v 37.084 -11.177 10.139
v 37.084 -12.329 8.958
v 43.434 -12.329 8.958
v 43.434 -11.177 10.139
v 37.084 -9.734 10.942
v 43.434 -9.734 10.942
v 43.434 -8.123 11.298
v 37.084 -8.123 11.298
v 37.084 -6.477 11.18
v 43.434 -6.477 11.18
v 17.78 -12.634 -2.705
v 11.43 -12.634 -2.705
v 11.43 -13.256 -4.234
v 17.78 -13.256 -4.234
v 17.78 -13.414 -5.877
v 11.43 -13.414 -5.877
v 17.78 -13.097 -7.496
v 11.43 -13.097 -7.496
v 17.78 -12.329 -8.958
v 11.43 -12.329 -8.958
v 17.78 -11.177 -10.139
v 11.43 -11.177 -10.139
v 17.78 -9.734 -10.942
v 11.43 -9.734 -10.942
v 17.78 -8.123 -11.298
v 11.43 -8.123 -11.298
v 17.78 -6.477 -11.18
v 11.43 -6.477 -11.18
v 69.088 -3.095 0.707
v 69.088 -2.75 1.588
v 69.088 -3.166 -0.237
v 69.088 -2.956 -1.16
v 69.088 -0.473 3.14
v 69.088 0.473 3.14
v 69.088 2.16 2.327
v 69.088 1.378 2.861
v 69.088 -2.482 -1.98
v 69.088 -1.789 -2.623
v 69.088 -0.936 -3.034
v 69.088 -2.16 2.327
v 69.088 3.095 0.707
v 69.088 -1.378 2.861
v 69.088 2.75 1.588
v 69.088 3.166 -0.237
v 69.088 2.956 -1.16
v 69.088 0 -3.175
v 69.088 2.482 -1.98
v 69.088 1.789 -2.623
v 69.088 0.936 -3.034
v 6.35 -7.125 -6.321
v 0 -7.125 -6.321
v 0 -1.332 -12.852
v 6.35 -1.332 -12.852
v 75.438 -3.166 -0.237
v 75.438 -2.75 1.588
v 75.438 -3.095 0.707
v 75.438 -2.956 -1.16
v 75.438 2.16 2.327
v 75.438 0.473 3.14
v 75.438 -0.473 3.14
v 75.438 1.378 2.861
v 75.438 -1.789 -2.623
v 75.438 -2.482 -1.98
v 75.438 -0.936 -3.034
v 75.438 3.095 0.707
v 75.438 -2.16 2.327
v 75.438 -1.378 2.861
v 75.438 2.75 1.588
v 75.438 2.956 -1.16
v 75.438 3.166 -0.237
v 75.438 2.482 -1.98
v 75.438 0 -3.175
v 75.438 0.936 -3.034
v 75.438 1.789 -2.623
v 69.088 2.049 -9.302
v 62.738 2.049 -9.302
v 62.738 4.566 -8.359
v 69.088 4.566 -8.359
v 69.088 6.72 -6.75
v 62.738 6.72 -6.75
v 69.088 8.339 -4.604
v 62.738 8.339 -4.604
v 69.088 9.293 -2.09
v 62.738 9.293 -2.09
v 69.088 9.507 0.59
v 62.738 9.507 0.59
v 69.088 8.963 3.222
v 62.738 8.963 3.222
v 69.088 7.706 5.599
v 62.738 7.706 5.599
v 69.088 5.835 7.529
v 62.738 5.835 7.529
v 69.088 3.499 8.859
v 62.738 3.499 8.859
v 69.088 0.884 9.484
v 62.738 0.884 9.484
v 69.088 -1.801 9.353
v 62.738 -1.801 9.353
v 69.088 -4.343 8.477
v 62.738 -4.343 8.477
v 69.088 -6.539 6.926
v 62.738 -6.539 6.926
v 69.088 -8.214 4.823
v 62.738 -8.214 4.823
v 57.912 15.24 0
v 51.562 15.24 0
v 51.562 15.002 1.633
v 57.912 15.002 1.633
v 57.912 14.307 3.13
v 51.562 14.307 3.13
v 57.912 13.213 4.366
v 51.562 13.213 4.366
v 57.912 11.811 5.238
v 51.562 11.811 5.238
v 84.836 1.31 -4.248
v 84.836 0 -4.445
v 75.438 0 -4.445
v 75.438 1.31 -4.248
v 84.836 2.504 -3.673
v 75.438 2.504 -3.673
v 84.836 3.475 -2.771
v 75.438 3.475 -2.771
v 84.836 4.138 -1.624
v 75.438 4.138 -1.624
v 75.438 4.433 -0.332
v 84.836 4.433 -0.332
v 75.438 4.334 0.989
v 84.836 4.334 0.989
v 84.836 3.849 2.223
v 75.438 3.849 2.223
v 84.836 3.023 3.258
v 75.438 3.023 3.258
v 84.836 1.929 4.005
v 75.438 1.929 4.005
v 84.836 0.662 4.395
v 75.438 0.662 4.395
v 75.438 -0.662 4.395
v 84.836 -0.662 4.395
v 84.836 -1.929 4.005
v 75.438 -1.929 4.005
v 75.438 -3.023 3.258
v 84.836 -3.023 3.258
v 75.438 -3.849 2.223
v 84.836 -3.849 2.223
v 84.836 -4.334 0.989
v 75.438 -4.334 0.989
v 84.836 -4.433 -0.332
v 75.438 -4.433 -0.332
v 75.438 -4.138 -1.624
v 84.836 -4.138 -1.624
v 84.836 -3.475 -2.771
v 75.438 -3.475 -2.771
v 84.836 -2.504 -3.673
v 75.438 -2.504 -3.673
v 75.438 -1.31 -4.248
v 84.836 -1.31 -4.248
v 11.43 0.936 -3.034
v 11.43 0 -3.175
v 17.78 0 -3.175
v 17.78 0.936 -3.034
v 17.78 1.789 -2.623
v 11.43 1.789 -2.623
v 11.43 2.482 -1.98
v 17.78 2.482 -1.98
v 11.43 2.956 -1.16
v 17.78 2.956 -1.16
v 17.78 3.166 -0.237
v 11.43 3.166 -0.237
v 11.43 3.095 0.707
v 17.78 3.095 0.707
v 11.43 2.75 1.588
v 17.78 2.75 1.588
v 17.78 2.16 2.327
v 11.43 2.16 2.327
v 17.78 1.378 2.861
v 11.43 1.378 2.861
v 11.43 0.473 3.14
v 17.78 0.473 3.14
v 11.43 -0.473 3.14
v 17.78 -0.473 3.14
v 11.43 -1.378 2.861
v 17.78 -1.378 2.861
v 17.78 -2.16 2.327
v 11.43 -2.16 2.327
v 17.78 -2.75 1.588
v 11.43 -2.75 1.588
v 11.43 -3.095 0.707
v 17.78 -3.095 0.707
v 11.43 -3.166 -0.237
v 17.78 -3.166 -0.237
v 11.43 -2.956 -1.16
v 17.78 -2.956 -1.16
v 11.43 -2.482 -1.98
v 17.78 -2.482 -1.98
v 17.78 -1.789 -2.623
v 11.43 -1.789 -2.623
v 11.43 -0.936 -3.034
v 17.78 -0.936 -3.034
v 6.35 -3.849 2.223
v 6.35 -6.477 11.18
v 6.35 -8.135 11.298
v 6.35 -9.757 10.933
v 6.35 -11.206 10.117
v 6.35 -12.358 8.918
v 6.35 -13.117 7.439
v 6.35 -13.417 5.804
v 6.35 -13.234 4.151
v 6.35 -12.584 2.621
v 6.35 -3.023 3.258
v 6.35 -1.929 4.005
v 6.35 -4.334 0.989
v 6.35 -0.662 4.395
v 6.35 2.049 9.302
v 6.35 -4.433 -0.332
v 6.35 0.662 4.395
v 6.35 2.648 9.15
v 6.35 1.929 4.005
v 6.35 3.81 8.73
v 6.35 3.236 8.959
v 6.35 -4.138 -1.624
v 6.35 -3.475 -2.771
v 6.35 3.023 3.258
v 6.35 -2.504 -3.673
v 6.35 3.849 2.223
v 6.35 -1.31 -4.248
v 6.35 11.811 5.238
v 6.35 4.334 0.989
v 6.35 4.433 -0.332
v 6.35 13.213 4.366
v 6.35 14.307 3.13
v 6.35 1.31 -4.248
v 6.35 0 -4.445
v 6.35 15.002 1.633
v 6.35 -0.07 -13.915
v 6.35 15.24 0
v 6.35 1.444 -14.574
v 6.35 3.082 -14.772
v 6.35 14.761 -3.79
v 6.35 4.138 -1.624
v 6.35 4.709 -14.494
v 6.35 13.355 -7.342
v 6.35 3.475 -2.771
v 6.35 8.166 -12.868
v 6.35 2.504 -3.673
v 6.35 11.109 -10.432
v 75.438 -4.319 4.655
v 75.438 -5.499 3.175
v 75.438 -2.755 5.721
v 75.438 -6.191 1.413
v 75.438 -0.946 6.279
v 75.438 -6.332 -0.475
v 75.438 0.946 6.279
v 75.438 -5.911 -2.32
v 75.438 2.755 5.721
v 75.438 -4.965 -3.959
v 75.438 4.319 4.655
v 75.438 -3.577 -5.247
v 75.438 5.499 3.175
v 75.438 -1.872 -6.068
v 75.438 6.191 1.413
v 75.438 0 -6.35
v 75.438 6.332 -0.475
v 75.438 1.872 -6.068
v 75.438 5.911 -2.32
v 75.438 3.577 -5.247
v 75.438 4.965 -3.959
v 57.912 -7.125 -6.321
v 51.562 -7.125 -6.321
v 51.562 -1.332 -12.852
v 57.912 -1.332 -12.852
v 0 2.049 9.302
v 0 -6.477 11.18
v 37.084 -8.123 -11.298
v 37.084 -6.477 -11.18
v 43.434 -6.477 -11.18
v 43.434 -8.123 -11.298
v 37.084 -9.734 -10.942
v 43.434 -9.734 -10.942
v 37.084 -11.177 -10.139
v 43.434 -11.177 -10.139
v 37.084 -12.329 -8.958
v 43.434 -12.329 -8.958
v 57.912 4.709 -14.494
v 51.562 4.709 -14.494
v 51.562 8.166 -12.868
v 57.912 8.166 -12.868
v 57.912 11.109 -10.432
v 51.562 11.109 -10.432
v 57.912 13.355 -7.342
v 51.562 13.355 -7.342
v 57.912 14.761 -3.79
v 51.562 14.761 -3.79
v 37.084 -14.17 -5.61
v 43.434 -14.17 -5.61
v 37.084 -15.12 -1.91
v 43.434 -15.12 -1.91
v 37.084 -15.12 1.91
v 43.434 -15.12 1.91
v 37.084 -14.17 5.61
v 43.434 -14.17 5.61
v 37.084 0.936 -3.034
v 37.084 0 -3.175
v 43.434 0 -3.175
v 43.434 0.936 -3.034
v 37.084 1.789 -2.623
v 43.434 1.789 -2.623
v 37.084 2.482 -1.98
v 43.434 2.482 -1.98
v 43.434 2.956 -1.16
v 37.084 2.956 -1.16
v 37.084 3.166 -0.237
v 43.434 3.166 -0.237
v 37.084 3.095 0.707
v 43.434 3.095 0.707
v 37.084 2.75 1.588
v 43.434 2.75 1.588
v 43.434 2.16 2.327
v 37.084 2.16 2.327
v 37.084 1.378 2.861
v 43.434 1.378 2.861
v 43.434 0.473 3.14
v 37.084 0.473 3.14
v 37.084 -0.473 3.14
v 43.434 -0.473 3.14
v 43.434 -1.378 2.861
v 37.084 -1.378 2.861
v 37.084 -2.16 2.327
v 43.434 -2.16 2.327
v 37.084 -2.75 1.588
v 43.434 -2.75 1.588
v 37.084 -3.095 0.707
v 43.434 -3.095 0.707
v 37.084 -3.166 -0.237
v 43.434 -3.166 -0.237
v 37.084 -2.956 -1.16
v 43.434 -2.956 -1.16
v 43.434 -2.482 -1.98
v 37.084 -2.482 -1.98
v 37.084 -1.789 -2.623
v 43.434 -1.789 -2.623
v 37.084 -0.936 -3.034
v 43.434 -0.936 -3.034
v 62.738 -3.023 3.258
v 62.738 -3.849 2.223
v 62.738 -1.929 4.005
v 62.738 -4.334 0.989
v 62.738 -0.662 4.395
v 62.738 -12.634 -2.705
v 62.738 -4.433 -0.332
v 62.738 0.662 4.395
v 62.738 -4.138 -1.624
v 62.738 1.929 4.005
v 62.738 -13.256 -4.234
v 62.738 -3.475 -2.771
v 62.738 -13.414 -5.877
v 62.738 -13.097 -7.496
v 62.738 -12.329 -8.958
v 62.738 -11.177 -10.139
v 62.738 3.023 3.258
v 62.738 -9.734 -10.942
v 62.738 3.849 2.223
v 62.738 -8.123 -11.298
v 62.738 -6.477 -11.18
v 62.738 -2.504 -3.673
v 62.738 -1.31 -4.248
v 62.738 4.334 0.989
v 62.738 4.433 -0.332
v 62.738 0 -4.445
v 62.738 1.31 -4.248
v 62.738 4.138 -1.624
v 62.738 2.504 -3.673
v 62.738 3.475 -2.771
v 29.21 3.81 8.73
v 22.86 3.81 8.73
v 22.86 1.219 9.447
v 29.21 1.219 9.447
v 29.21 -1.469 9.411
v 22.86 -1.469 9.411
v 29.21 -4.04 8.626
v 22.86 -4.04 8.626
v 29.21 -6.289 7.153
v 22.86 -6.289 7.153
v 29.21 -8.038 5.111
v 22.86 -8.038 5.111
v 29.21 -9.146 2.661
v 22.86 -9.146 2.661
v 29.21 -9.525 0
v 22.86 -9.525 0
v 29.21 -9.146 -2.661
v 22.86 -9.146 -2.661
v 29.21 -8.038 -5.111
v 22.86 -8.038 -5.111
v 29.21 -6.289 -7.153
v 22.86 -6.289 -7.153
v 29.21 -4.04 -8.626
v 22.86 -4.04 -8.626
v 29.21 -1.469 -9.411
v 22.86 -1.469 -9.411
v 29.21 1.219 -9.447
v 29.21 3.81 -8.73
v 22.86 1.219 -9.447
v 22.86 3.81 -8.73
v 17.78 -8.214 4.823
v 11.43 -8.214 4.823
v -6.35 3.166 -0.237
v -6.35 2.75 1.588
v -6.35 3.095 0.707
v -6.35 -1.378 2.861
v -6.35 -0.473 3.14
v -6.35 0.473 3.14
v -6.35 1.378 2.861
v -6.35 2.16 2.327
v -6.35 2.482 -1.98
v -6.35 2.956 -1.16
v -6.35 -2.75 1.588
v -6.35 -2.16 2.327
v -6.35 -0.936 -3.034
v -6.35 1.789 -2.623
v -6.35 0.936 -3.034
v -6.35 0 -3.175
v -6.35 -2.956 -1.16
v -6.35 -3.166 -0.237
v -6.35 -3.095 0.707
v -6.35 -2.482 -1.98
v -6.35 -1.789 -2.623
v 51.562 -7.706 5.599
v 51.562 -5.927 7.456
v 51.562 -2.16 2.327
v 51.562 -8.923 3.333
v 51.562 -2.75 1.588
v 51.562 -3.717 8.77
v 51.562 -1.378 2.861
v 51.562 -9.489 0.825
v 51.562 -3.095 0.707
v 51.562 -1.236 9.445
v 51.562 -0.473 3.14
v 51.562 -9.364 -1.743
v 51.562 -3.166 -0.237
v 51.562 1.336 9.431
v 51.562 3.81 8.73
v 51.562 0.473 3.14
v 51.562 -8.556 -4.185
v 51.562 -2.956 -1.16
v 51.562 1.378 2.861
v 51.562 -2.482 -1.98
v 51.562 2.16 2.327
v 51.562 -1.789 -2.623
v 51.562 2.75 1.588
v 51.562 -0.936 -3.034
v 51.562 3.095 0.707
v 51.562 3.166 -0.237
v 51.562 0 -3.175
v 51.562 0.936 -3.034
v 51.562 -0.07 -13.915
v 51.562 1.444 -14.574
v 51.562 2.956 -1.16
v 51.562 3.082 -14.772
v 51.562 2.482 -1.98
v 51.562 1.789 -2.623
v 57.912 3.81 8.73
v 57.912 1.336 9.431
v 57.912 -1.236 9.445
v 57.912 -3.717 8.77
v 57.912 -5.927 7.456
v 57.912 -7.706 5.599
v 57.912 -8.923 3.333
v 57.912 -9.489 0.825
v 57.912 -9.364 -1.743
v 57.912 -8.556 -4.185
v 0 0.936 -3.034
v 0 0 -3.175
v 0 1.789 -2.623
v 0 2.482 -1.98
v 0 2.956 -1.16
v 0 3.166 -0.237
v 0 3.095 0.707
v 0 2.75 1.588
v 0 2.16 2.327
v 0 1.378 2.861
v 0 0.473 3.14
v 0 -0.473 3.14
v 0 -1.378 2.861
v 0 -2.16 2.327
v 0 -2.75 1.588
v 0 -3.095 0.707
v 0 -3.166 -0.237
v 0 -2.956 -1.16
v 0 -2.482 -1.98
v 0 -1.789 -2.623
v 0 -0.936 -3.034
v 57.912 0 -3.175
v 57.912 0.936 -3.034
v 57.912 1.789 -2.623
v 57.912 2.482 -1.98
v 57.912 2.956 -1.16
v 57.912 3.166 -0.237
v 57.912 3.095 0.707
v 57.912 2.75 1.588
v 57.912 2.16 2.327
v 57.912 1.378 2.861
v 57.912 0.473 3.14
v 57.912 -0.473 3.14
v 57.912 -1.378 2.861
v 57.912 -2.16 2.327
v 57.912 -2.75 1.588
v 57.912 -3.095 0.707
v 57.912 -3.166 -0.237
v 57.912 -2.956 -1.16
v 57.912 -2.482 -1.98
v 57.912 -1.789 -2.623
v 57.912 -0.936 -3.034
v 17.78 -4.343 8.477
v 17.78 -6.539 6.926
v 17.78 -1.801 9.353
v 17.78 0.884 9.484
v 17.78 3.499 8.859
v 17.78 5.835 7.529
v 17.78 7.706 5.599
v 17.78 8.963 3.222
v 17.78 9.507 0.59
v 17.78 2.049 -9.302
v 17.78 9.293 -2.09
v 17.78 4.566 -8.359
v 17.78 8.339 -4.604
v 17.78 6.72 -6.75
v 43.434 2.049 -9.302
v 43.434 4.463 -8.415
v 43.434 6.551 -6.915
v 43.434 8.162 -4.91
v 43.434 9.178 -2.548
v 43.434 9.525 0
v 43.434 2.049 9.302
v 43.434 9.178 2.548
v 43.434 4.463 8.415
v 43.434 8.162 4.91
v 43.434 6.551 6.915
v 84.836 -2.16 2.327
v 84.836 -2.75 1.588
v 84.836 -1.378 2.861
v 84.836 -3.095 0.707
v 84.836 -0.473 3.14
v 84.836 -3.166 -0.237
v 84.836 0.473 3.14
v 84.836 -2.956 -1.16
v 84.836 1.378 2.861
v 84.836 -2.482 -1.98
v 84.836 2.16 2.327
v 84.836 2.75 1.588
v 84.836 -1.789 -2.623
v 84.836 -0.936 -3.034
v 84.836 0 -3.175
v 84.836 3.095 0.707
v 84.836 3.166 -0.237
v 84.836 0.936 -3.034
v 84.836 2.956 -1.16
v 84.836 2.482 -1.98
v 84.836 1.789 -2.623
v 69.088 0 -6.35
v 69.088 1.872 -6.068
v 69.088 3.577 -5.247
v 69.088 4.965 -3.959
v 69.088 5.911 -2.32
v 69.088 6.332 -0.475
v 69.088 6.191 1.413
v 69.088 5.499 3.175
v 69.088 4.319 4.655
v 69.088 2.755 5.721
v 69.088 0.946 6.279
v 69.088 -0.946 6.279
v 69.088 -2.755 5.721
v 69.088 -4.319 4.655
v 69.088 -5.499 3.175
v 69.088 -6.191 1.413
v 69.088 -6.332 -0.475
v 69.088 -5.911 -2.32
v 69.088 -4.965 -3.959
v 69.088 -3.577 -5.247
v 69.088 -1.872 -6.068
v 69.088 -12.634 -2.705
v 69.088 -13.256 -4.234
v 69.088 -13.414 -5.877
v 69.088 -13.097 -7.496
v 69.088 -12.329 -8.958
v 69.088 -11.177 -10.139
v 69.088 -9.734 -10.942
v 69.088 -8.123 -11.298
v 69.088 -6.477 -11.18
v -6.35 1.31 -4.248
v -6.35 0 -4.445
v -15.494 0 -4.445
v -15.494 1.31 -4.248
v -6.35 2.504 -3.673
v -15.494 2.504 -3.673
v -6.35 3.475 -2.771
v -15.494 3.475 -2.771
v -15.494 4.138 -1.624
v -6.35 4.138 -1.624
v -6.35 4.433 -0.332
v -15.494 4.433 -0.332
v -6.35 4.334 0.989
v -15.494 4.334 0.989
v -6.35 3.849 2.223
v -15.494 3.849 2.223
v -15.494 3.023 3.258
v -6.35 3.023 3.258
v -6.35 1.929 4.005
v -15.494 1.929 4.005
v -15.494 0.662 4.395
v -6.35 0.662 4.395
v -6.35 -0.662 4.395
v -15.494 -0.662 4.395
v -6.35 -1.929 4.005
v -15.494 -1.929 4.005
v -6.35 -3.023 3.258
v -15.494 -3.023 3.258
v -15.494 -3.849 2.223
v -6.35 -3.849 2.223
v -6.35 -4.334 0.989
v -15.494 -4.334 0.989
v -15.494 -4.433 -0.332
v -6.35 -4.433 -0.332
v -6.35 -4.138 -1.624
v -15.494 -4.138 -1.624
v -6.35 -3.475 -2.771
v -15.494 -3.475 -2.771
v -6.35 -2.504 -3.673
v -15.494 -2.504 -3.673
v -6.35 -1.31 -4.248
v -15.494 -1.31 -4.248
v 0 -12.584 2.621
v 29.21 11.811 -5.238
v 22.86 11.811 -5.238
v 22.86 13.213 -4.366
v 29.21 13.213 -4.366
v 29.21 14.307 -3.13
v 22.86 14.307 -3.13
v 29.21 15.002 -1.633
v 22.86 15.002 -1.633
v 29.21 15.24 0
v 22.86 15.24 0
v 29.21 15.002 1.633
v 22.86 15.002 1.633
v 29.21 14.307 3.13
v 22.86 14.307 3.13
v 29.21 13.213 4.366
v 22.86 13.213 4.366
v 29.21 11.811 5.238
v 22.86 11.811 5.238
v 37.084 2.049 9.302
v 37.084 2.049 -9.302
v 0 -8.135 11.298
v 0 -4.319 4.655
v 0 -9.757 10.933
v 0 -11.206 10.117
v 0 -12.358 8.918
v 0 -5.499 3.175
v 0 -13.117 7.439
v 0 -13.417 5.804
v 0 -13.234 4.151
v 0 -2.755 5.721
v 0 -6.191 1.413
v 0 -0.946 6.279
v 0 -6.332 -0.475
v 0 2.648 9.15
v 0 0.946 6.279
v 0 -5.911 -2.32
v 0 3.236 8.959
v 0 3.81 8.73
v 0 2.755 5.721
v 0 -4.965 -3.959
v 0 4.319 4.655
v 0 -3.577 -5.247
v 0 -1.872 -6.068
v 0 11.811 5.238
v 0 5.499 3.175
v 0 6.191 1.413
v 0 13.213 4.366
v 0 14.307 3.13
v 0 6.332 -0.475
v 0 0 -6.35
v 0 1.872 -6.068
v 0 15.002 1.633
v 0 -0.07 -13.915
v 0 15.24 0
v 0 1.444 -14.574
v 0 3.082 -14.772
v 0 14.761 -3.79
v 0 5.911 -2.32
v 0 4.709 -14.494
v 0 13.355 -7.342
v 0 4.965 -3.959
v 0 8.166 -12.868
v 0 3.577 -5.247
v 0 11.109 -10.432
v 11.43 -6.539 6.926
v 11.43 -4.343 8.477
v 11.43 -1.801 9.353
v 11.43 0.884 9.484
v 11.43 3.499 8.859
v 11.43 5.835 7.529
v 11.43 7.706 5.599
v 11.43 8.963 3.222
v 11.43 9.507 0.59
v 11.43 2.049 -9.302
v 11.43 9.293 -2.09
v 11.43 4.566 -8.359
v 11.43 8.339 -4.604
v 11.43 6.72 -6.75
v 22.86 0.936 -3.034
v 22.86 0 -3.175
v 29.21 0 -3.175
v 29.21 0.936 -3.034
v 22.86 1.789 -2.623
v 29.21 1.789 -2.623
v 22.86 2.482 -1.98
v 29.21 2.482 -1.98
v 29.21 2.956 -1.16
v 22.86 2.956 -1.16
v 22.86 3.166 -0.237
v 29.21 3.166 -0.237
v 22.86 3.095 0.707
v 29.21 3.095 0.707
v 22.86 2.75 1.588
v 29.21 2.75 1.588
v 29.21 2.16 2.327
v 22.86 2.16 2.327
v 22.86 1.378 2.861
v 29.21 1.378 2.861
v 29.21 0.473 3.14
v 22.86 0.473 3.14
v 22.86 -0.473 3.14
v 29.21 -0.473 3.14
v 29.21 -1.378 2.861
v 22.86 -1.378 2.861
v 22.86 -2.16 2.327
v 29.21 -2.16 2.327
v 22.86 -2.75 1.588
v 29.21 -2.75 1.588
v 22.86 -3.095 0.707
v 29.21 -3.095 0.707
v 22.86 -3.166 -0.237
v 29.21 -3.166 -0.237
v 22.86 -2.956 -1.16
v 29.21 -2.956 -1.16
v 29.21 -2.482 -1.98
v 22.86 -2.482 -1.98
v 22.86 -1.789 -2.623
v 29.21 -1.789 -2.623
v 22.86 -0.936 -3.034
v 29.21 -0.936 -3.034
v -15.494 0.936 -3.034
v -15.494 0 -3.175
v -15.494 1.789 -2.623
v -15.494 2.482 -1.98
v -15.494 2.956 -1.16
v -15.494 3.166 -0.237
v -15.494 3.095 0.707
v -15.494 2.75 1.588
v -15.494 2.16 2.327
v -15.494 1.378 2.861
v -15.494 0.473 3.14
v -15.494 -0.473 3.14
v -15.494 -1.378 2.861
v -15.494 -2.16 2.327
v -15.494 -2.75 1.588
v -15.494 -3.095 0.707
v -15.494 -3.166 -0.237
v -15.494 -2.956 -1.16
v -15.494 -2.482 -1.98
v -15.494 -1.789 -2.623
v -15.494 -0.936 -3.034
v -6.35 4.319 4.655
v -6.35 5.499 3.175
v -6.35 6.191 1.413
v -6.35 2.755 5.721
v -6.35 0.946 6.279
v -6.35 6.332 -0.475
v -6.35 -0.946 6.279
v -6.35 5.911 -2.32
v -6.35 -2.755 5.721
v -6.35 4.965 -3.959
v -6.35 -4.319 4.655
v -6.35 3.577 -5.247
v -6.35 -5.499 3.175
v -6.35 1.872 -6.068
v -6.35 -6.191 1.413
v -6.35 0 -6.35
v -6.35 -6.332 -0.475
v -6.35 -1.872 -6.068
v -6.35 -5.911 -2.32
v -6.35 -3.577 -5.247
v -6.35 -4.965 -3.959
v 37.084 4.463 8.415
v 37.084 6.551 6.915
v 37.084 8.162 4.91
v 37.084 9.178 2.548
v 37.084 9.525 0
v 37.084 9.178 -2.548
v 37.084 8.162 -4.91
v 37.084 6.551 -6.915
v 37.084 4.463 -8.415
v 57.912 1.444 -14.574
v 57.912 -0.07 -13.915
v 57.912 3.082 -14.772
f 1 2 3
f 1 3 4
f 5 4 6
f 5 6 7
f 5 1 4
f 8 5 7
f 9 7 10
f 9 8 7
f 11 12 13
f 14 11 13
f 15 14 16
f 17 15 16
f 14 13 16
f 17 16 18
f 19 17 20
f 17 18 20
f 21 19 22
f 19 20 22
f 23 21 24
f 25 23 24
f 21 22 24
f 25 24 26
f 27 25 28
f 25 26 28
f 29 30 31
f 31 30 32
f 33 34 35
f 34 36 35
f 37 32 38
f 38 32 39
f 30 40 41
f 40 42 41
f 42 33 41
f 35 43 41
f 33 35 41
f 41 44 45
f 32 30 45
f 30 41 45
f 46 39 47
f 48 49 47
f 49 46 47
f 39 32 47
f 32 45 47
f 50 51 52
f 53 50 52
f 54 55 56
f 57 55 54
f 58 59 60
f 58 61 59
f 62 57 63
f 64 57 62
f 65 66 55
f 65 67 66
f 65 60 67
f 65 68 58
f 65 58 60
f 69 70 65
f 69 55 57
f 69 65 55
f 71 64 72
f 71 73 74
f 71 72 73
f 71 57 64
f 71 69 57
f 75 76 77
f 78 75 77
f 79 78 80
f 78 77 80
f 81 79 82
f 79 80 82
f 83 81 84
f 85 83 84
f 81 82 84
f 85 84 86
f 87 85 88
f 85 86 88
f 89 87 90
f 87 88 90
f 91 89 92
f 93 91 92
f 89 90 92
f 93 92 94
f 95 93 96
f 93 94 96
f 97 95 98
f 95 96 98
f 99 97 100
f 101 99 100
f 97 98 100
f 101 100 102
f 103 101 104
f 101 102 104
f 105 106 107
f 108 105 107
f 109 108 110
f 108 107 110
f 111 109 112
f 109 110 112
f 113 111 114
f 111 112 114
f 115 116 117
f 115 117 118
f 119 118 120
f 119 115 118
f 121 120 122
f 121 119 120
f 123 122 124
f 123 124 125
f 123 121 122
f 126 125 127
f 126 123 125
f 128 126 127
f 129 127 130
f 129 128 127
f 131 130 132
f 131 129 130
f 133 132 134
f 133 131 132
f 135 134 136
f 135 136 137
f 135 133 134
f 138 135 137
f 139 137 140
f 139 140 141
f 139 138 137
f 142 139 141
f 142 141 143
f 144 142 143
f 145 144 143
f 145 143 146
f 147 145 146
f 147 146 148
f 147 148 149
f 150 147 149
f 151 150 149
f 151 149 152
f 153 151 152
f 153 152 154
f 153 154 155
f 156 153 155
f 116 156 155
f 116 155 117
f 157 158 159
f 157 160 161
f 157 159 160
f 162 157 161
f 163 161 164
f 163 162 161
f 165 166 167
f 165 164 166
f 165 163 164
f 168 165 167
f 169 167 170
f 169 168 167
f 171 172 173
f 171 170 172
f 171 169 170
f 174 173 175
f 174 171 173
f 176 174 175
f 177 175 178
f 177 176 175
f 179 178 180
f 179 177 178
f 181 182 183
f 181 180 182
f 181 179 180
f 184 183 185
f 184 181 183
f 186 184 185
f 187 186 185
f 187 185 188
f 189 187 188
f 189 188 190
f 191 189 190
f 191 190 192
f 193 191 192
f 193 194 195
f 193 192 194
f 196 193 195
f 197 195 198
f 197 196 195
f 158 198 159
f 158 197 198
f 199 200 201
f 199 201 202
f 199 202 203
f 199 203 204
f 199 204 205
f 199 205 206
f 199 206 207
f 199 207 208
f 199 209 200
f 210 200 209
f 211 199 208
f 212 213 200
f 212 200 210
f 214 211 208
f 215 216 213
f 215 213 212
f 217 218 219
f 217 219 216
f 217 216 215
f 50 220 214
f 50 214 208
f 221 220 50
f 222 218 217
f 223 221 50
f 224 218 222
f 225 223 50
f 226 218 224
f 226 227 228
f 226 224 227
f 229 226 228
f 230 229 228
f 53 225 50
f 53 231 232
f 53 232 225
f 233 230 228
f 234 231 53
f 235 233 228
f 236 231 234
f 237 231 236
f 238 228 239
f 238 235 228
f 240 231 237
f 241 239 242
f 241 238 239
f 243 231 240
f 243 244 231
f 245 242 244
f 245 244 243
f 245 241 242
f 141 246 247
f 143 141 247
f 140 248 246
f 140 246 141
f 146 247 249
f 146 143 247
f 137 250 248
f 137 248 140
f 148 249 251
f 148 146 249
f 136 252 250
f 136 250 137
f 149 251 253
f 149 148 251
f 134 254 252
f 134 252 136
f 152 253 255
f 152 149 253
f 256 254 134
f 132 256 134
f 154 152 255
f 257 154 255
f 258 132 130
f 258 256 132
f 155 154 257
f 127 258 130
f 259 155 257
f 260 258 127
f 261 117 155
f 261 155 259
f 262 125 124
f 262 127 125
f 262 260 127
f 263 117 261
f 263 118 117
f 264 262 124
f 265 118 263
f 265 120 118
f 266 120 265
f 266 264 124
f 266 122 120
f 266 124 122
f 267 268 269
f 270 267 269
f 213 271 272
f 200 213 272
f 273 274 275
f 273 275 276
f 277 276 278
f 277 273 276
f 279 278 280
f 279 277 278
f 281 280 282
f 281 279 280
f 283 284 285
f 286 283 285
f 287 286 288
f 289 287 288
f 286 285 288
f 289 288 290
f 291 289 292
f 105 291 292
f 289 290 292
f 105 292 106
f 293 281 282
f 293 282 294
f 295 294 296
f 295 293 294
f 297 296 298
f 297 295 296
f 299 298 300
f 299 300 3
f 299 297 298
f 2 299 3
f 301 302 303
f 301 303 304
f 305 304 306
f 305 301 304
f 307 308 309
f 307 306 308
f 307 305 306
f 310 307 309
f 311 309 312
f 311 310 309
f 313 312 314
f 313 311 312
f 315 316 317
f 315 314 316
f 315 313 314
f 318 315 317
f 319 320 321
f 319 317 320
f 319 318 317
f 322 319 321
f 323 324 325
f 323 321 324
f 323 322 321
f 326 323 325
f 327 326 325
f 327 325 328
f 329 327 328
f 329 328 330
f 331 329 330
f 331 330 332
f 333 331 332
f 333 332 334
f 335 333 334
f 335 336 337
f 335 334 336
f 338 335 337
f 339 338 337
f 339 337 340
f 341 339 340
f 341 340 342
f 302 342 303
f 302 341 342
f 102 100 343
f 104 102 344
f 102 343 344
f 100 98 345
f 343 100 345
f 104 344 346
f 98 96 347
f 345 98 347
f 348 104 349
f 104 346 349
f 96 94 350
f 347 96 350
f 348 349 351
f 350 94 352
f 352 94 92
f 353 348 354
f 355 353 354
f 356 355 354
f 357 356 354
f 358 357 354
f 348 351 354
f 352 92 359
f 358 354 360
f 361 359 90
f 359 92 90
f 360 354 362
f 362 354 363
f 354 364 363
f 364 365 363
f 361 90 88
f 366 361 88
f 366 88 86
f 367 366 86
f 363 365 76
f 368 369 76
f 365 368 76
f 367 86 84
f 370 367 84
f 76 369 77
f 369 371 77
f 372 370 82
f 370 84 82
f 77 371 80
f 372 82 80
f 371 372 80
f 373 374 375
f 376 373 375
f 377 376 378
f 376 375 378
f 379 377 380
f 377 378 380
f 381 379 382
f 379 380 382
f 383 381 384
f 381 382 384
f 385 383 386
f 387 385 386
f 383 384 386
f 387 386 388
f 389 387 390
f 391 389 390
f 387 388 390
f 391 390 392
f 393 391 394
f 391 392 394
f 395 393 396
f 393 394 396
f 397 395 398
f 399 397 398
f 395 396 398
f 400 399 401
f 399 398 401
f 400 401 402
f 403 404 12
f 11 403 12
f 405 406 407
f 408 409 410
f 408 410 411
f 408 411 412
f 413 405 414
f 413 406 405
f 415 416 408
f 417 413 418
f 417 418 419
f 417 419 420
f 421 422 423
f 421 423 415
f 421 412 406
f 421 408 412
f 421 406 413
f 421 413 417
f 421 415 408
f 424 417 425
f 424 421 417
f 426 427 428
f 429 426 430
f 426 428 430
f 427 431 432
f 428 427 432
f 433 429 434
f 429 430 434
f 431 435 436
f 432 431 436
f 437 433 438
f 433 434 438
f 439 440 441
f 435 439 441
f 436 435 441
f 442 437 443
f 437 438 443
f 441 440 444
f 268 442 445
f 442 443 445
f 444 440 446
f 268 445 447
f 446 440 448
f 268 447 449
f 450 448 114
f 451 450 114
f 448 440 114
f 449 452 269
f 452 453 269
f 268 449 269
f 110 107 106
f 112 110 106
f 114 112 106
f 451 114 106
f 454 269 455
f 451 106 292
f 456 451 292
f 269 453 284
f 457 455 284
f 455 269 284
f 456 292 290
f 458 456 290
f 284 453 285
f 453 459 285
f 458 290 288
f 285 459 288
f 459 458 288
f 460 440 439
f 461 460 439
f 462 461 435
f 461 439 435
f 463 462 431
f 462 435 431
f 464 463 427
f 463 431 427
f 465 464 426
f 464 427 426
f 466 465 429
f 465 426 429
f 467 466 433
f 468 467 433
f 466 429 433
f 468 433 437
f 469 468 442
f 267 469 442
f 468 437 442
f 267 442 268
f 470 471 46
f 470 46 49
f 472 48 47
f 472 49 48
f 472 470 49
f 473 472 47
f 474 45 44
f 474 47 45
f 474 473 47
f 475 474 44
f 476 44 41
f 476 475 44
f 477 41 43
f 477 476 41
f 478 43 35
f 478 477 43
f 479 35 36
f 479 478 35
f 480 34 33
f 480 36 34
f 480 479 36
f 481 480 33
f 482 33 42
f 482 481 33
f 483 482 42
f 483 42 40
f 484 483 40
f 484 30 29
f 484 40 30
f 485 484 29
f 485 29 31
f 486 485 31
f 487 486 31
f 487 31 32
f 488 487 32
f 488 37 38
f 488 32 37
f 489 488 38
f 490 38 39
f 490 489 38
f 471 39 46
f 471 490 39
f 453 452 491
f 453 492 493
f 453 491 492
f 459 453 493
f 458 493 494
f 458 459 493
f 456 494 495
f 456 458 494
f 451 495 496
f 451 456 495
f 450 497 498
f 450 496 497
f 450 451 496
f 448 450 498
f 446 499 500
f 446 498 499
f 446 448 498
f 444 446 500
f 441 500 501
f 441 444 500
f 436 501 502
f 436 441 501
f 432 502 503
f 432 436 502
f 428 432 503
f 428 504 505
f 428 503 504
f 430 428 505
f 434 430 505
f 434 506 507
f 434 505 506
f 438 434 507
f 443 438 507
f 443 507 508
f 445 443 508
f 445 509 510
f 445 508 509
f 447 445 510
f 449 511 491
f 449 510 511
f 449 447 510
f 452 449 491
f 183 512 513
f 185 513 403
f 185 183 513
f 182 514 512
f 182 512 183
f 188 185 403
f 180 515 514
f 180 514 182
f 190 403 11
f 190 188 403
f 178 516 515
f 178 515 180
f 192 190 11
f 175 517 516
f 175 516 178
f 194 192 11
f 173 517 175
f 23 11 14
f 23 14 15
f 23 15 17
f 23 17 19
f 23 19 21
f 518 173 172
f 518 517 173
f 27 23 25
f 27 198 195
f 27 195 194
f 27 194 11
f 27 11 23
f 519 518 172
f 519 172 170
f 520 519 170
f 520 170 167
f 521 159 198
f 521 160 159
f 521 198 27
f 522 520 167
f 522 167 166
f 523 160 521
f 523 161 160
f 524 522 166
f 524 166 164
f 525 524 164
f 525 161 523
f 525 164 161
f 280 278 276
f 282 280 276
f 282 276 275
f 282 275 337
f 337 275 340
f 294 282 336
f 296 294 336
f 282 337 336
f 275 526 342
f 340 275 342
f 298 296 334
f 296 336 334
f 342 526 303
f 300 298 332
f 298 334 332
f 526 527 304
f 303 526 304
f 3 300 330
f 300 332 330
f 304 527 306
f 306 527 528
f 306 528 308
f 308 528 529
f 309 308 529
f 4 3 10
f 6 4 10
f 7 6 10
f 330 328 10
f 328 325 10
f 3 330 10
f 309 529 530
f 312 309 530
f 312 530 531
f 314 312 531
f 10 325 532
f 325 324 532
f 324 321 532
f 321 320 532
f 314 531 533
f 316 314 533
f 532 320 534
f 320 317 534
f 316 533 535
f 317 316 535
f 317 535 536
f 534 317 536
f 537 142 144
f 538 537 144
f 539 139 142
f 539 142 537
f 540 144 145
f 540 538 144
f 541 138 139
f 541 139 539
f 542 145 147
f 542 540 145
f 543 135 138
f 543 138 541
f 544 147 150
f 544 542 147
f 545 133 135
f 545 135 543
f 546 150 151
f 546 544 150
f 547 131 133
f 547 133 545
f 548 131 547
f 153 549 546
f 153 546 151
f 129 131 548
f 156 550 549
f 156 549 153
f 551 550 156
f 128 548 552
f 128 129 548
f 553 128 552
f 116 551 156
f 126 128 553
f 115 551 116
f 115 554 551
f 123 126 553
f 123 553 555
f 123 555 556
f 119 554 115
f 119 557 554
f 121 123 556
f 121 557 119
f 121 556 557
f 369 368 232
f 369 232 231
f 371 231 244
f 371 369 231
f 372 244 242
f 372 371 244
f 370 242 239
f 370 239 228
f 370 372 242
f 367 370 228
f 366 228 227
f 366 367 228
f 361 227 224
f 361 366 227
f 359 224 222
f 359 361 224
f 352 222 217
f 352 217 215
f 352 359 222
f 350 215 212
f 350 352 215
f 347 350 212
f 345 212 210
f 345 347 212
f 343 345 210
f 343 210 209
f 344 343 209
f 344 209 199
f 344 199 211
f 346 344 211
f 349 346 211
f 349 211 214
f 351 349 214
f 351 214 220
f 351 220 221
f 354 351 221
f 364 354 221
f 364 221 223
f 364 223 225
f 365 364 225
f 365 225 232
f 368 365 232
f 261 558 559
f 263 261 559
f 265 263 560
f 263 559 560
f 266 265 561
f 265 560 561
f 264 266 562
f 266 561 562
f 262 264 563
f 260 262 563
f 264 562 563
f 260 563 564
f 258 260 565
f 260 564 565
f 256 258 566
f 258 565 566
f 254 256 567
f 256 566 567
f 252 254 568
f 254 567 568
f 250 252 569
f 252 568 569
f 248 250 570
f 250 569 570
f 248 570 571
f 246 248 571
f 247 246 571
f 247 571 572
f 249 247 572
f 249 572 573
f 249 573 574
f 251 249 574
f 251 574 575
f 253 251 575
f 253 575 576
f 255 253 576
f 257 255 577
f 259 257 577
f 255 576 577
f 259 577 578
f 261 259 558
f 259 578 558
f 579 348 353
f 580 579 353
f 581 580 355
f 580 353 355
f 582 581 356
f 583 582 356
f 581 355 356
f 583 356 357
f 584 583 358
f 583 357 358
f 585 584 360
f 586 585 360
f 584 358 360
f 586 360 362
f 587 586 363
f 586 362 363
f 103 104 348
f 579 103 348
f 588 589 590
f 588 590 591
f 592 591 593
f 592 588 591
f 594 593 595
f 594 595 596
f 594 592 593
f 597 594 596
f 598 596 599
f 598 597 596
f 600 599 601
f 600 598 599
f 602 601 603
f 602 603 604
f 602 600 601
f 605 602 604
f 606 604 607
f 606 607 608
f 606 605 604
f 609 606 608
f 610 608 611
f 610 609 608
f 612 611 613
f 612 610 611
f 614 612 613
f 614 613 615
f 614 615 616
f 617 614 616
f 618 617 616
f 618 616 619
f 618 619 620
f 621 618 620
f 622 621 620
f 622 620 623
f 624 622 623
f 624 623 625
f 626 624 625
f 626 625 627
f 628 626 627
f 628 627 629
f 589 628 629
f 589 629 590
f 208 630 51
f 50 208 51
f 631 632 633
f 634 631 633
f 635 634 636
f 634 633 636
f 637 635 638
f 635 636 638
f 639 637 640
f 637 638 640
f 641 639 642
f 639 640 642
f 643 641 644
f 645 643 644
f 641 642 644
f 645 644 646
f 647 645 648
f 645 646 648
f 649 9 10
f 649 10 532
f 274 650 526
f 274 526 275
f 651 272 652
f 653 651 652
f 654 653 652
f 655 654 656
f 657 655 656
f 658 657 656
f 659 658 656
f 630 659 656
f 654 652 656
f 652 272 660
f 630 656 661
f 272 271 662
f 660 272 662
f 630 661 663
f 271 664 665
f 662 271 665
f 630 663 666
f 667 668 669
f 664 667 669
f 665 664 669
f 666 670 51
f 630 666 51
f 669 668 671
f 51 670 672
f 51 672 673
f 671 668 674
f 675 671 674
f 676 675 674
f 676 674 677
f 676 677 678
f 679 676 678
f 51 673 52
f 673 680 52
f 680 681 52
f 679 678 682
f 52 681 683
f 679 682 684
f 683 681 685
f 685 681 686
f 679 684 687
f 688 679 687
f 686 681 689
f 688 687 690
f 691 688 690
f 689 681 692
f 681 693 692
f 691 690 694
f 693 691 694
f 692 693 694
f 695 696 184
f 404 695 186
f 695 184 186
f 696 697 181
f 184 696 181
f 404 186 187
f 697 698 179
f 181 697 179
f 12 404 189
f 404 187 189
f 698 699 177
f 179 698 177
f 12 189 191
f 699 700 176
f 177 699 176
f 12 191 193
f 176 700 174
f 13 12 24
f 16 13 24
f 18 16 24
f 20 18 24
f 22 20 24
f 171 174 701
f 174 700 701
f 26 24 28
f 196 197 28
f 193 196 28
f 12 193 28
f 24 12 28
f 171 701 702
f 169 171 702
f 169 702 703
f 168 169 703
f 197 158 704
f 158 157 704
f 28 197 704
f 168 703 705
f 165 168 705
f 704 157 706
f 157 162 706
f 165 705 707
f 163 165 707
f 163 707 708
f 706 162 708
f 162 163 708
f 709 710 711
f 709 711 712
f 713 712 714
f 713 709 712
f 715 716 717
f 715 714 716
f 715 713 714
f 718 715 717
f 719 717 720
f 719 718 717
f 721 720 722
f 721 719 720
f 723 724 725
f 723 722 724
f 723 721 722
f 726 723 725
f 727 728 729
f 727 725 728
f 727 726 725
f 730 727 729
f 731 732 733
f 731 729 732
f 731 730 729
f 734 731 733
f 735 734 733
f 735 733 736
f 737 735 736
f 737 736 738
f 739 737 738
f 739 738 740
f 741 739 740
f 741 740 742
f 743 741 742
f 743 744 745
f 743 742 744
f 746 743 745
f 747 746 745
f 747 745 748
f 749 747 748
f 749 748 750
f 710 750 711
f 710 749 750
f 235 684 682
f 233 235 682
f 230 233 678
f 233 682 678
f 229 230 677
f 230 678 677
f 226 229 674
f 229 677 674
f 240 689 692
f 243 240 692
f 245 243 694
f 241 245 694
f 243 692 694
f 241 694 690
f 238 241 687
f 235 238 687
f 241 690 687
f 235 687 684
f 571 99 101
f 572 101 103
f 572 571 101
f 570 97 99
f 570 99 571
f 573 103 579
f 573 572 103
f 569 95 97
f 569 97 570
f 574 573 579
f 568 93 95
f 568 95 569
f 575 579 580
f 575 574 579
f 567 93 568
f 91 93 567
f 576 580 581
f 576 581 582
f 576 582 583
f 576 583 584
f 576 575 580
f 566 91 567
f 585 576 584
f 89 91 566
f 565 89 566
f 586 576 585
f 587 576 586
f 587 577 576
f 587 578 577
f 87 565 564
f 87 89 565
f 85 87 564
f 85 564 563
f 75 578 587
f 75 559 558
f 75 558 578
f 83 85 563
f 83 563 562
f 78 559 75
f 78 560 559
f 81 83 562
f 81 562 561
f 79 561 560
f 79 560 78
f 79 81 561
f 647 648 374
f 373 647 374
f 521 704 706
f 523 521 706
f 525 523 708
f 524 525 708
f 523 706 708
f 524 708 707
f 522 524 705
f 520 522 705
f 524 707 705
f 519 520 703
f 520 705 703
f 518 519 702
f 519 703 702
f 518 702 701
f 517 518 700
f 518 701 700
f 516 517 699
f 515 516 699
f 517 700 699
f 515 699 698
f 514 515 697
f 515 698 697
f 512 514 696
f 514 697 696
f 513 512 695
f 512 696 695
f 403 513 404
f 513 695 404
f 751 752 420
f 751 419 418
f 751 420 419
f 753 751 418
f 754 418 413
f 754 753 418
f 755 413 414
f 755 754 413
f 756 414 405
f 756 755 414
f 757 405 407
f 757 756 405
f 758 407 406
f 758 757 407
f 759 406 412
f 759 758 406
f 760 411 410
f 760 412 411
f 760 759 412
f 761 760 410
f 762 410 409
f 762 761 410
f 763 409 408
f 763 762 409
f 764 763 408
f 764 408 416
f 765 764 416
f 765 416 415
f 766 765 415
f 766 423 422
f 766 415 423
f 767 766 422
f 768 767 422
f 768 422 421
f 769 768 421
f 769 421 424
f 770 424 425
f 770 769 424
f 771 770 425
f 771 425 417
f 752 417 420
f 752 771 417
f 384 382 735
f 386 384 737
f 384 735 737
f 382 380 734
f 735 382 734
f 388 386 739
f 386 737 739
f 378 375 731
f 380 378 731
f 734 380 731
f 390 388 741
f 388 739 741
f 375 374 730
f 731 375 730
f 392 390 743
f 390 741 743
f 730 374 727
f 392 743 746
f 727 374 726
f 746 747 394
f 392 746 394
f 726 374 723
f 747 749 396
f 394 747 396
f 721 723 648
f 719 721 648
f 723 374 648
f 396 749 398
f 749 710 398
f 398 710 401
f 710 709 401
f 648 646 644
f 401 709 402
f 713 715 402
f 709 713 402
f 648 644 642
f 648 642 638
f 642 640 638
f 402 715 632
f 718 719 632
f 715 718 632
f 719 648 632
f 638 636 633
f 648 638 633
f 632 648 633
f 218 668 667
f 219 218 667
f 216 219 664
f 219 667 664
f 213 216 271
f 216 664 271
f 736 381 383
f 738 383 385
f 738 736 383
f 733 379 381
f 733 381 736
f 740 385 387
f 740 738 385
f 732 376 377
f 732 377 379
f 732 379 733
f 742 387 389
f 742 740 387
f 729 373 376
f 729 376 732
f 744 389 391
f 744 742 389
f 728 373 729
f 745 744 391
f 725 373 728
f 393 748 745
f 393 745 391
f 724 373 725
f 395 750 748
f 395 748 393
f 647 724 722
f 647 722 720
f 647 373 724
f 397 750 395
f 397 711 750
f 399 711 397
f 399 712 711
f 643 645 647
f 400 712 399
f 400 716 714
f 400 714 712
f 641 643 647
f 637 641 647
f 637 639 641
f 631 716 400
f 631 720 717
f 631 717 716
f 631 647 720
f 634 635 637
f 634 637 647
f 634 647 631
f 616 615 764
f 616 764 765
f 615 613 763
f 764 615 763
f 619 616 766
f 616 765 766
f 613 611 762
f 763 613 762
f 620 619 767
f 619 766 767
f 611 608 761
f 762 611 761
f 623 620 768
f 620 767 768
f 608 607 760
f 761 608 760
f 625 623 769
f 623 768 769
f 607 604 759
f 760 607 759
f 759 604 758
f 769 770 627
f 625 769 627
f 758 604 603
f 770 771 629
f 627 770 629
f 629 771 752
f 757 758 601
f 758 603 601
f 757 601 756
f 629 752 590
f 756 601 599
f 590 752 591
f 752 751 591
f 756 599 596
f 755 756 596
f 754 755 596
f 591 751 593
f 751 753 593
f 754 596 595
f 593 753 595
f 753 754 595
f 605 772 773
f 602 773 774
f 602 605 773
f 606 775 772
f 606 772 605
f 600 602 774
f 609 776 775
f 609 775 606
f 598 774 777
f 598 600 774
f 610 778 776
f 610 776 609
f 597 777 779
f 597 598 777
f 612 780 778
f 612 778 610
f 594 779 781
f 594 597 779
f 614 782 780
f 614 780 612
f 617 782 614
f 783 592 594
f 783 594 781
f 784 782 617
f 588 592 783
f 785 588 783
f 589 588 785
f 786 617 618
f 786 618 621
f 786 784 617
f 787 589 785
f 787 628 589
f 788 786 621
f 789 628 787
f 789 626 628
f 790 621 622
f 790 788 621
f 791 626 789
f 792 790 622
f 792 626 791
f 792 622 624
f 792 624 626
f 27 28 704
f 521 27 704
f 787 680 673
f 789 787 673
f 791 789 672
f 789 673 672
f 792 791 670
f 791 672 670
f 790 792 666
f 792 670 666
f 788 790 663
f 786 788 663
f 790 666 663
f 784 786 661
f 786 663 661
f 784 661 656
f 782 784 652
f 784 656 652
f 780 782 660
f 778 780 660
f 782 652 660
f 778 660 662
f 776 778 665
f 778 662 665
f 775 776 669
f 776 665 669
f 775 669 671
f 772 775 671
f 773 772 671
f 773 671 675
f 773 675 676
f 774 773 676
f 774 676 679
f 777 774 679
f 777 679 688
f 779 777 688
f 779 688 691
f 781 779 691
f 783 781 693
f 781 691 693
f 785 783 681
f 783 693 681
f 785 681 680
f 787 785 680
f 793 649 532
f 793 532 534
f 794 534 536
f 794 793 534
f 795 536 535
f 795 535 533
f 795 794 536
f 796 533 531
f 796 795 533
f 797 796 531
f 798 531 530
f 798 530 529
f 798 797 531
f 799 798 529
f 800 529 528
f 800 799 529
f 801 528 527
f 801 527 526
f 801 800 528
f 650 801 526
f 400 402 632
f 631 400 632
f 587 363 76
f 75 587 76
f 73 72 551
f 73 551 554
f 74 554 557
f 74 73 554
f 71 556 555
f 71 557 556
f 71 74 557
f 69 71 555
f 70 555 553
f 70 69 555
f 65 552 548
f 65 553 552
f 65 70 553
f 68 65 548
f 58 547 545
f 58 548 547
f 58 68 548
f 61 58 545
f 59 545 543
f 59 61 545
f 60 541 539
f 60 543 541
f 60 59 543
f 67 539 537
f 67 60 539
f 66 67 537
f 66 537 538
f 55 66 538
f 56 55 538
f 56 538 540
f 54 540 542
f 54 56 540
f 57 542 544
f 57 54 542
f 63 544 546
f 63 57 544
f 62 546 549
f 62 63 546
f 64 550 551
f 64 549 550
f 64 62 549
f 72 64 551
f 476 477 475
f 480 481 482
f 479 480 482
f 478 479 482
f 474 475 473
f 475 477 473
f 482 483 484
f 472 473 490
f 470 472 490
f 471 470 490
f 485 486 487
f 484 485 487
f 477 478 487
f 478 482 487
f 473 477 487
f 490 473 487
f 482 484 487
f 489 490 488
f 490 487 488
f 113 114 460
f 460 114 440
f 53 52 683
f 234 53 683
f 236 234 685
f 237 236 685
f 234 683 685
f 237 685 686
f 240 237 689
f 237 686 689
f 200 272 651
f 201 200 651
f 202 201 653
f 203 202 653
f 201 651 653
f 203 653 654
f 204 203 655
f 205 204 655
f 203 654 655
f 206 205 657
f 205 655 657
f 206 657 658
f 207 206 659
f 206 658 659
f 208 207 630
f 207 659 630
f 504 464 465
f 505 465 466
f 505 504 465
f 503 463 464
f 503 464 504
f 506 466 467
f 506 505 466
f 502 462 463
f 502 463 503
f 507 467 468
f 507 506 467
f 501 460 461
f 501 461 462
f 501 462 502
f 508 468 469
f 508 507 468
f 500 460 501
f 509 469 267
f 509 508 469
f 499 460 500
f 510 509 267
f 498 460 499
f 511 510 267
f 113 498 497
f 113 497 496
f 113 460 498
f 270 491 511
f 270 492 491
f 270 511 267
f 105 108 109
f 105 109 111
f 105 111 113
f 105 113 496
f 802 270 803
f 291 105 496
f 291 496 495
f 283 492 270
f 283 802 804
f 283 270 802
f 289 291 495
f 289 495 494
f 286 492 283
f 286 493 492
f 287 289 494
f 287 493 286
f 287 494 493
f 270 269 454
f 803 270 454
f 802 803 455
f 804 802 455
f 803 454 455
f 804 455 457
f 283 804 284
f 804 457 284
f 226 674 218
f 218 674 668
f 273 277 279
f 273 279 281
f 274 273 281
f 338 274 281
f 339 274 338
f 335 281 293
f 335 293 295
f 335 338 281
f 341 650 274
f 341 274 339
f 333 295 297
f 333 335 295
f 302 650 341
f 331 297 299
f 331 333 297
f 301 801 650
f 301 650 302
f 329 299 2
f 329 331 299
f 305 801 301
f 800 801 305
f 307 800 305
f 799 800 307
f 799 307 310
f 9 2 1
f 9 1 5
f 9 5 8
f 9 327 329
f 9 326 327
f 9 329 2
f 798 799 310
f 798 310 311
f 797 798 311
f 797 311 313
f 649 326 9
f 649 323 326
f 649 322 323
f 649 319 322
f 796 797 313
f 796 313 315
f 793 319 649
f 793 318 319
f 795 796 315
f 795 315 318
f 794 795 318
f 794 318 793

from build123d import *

# Parameters (mm, degrees)
BOSS_EXTRUDE1_DEPTH     = 6.35
BOSS_EXTRUDE2_START     = 5.08
BOSS_EXTRUDE2_DEPTH     = 6.35
BOSS_EXTRUDE3_START     = 5.08
BOSS_EXTRUDE3_DEPTH     = 6.35
BOSS_EXTRUDE4_START     = 7.874
BOSS_EXTRUDE4_DEPTH     = 6.35
BOSS_EXTRUDE5_START     = -1.778
BOSS_EXTRUDE5_DEPTH     = 6.35
BOSS_EXTRUDE6_START     = 4.826
BOSS_EXTRUDE6_DEPTH     = 6.35
BOSS_EXTRUDE7_START     = 1.016
SKETCH7_R               = 4.445
BOSS_EXTRUDE7_DEPTH     = 100.33
CUT_EXTRUDE1_DEPTH      = 103.55063169
CUT_EXTRUDE1_DEPTH_BACK = 103.55063169
SKETCH8_R               = 3.175
SKETCH9_R               = 6.35
BOSS_EXTRUDE8_DEPTH     = 6.35
SKETCH10_R              = 6.35
BOSS_EXTRUDE9_DEPTH     = 6.35


with BuildPart() as part:
    # Sketch1 → Boss-Extrude1 (new body)
    with BuildSketch(Plane(origin=(0, 0, 0), x_dir=(0, 0, -1), z_dir=(1, 0, 0))):
        with BuildLine():
            Line((-5.237884019, 11.811), (-8.729806699, 3.81))
            ThreePointArc((-8.729806699, 3.81), (-9.058813318, 2.943386871), (-9.302023788, 2.048896884))
            Line((-9.302023788, 2.048896884), (-11.179868801, -6.476548741))
            ThreePointArc((-11.179868801, -6.476548741), (-8.918189467, -12.3579738), (-2.620941048, -12.583842123))
            Line((-2.620941048, -12.583842123), (6.321183955, -7.125184798))
            Line((6.321183955, -7.125184798), (12.851523691, -1.331724008))
            ThreePointArc((12.851523691, -1.331724008), (14.573597143, 1.443925515), (14.494101308, 4.709418994))
            ThreePointArc((14.494101308, 4.709418994), (8.957847245, 12.329418994), (0, 15.24))
            ThreePointArc((0, 15.24), (-3.130234416, 14.306512052), (-5.237884019, 11.811))
        make_face()
    extrude(amount=BOSS_EXTRUDE1_DEPTH)


with BuildPart() as body_2:
    # Sketch2 → Boss-Extrude2 (new body)
    with BuildSketch(Plane(origin=(6.35, 0, 0), x_dir=(0, 0, -1), z_dir=(1, 0, 0)).offset(BOSS_EXTRUDE2_START)):
        with BuildLine():
            Line((11.179868801, -6.476548741), (9.302023788, 2.048896884))
            ThreePointArc((9.302023788, 2.048896884), (-5.598654528, 7.705886871), (-4.823100166, -8.213606382))
            Line((-4.823100166, -8.213606382), (2.704794429, -12.6340507))
            ThreePointArc((2.704794429, -12.6340507), (8.957847245, -12.329418994), (11.179868801, -6.476548741))
        make_face()
    extrude(amount=BOSS_EXTRUDE2_DEPTH)


with BuildPart() as body_3:
    # Sketch3 → Boss-Extrude3 (new body)
    with BuildSketch(Plane(origin=(17.78, 0, 0), x_dir=(0, 0, -1), z_dir=(1, 0, 0)).offset(BOSS_EXTRUDE3_START)):
        with BuildLine():
            Line((-5.237884019, 11.811), (-8.729806699, 3.81))
            ThreePointArc((-8.729806699, 3.81), (0, -9.525), (8.729806699, 3.81))
            Line((8.729806699, 3.81), (5.237884019, 11.811))
            ThreePointArc((5.237884019, 11.811), (0, 15.24), (-5.237884019, 11.811))
        make_face()
    extrude(amount=BOSS_EXTRUDE3_DEPTH)


with BuildPart() as body_4:
    # Sketch4 → Boss-Extrude4 (new body)
    with BuildSketch(Plane(origin=(29.21, 0, 0), x_dir=(0, 0, -1), z_dir=(1, 0, 0)).offset(BOSS_EXTRUDE4_START)):
        with BuildLine():
            Line((-11.179868801, -6.476548741), (-9.302023788, 2.048896884))
            ThreePointArc((-9.302023788, 2.048896884), (0, 9.525), (9.302023788, 2.048896884))
            Line((9.302023788, 2.048896884), (11.179868801, -6.476548741))
            ThreePointArc((11.179868801, -6.476548741), (10.941569635, -9.734305754), (8.957847245, -12.329418994))
            ThreePointArc((8.957847245, -12.329418994), (0, -15.24), (-8.957847245, -12.329418994))
            ThreePointArc((-8.957847245, -12.329418994), (-10.941569635, -9.734305754), (-11.179868801, -6.476548741))
        make_face()
    extrude(amount=BOSS_EXTRUDE4_DEPTH)


with BuildPart() as body_5:
    # Sketch5 → Boss-Extrude5 (new body)
    with BuildSketch(Plane(origin=(53.34, 0, 0), x_dir=(0, 0, -1), z_dir=(1, 0, 0)).offset(BOSS_EXTRUDE5_START)):
        with BuildLine():
            Line((-5.237884019, 11.811), (-8.729806699, 3.81))
            ThreePointArc((-8.729806699, 3.81), (-5.598654528, -7.705886871), (6.321183955, -7.125184798))
            Line((6.321183955, -7.125184798), (12.851523691, -1.331724008))
            ThreePointArc((12.851523691, -1.331724008), (14.573597143, 1.443925515), (14.494101308, 4.709418994))
            ThreePointArc((14.494101308, 4.709418994), (8.957847245, 12.329418994), (0, 15.24))
            ThreePointArc((0, 15.24), (-3.130234416, 14.306512052), (-5.237884019, 11.811))
        make_face()
    extrude(amount=BOSS_EXTRUDE5_DEPTH)


with BuildPart() as body_6:
    # Sketch6 → Boss-Extrude6 (new body)
    with BuildSketch(Plane(origin=(57.912, 0, 0), x_dir=(0, 0, -1), z_dir=(1, 0, 0)).offset(BOSS_EXTRUDE6_START)):
        with BuildLine():
            Line((11.179868801, -6.476548741), (9.302023788, 2.048896884))
            ThreePointArc((9.302023788, 2.048896884), (-5.598654528, 7.705886871), (-4.823100166, -8.213606382))
            Line((-4.823100166, -8.213606382), (2.704794429, -12.6340507))
            ThreePointArc((2.704794429, -12.6340507), (8.957847245, -12.329418994), (11.179868801, -6.476548741))
        make_face()
    extrude(amount=BOSS_EXTRUDE6_DEPTH)


with BuildPart() as body_7:
    # Sketch7 → Boss-Extrude7 (new body)
    with BuildSketch(Plane(origin=(83.82, 0, 0), x_dir=(0, 0, -1), z_dir=(1, 0, 0)).offset(BOSS_EXTRUDE7_START)):
        Circle(SKETCH7_R)
    extrude(amount=-BOSS_EXTRUDE7_DEPTH)


with BuildPart() as cut_extrude1_tool:
    # Sketch8 → Cut-Extrude1 (new, two sides: drawn at the far end of the back side and taken through both)
    with BuildSketch(Plane(origin=(84.836, 0, 0), x_dir=(0, 0, -1), z_dir=(1, 0, 0)).offset(-CUT_EXTRUDE1_DEPTH_BACK)):
        Circle(SKETCH8_R)
    extrude(amount=CUT_EXTRUDE1_DEPTH + CUT_EXTRUDE1_DEPTH_BACK)


with BuildPart() as part_1:
    add(part.part)

    # Cut-Extrude1: cut by cut_extrude1_tool
    add(cut_extrude1_tool.part, mode=Mode.SUBTRACT)



with BuildPart() as body_2_1:
    add(body_2.part)

    # Cut-Extrude1: cut by cut_extrude1_tool
    add(cut_extrude1_tool.part, mode=Mode.SUBTRACT)


with BuildPart() as body_3_1:
    add(body_3.part)

    # Cut-Extrude1: cut by cut_extrude1_tool
    add(cut_extrude1_tool.part, mode=Mode.SUBTRACT)


with BuildPart() as body_4_1:
    add(body_4.part)

    # Cut-Extrude1: cut by cut_extrude1_tool
    add(cut_extrude1_tool.part, mode=Mode.SUBTRACT)


with BuildPart() as body_5_1:
    add(body_5.part)

    # Cut-Extrude1: cut by cut_extrude1_tool
    add(cut_extrude1_tool.part, mode=Mode.SUBTRACT)


with BuildPart() as body_6_1:
    add(body_6.part)

    # Cut-Extrude1: cut by cut_extrude1_tool
    add(cut_extrude1_tool.part, mode=Mode.SUBTRACT)



with BuildPart() as body_7_1:
    add(body_7.part)

    # Cut-Extrude1: cut by cut_extrude1_tool
    add(cut_extrude1_tool.part, mode=Mode.SUBTRACT)


with BuildPart() as body_6_2:
    add(body_6_1.part)

    add(body_7_1.part)  # Boss-Extrude8 merges body 7
    # Sketch9 → Boss-Extrude8 (add)
    with BuildSketch(Plane(origin=(69.088, 0, 0), x_dir=(0, 0, -1), z_dir=(1, 0, 0))):
        Circle(SKETCH9_R)
    extrude(amount=BOSS_EXTRUDE8_DEPTH)


with BuildPart() as part_2:
    add(part_1.part)

    add(body_6_2.part)  # Boss-Extrude9 merges body 6
    # Sketch10 → Boss-Extrude9 (add)
    with BuildSketch(Plane.ZY):
        with Locations(Location((0, 0, 0), (0, 0, 180))):
            Circle(SKETCH10_R)
    extrude(amount=BOSS_EXTRUDE9_DEPTH)


solid = Compound([body_2_1.part, body_3_1.part, body_4_1.part, body_5_1.part, part_2.part])
